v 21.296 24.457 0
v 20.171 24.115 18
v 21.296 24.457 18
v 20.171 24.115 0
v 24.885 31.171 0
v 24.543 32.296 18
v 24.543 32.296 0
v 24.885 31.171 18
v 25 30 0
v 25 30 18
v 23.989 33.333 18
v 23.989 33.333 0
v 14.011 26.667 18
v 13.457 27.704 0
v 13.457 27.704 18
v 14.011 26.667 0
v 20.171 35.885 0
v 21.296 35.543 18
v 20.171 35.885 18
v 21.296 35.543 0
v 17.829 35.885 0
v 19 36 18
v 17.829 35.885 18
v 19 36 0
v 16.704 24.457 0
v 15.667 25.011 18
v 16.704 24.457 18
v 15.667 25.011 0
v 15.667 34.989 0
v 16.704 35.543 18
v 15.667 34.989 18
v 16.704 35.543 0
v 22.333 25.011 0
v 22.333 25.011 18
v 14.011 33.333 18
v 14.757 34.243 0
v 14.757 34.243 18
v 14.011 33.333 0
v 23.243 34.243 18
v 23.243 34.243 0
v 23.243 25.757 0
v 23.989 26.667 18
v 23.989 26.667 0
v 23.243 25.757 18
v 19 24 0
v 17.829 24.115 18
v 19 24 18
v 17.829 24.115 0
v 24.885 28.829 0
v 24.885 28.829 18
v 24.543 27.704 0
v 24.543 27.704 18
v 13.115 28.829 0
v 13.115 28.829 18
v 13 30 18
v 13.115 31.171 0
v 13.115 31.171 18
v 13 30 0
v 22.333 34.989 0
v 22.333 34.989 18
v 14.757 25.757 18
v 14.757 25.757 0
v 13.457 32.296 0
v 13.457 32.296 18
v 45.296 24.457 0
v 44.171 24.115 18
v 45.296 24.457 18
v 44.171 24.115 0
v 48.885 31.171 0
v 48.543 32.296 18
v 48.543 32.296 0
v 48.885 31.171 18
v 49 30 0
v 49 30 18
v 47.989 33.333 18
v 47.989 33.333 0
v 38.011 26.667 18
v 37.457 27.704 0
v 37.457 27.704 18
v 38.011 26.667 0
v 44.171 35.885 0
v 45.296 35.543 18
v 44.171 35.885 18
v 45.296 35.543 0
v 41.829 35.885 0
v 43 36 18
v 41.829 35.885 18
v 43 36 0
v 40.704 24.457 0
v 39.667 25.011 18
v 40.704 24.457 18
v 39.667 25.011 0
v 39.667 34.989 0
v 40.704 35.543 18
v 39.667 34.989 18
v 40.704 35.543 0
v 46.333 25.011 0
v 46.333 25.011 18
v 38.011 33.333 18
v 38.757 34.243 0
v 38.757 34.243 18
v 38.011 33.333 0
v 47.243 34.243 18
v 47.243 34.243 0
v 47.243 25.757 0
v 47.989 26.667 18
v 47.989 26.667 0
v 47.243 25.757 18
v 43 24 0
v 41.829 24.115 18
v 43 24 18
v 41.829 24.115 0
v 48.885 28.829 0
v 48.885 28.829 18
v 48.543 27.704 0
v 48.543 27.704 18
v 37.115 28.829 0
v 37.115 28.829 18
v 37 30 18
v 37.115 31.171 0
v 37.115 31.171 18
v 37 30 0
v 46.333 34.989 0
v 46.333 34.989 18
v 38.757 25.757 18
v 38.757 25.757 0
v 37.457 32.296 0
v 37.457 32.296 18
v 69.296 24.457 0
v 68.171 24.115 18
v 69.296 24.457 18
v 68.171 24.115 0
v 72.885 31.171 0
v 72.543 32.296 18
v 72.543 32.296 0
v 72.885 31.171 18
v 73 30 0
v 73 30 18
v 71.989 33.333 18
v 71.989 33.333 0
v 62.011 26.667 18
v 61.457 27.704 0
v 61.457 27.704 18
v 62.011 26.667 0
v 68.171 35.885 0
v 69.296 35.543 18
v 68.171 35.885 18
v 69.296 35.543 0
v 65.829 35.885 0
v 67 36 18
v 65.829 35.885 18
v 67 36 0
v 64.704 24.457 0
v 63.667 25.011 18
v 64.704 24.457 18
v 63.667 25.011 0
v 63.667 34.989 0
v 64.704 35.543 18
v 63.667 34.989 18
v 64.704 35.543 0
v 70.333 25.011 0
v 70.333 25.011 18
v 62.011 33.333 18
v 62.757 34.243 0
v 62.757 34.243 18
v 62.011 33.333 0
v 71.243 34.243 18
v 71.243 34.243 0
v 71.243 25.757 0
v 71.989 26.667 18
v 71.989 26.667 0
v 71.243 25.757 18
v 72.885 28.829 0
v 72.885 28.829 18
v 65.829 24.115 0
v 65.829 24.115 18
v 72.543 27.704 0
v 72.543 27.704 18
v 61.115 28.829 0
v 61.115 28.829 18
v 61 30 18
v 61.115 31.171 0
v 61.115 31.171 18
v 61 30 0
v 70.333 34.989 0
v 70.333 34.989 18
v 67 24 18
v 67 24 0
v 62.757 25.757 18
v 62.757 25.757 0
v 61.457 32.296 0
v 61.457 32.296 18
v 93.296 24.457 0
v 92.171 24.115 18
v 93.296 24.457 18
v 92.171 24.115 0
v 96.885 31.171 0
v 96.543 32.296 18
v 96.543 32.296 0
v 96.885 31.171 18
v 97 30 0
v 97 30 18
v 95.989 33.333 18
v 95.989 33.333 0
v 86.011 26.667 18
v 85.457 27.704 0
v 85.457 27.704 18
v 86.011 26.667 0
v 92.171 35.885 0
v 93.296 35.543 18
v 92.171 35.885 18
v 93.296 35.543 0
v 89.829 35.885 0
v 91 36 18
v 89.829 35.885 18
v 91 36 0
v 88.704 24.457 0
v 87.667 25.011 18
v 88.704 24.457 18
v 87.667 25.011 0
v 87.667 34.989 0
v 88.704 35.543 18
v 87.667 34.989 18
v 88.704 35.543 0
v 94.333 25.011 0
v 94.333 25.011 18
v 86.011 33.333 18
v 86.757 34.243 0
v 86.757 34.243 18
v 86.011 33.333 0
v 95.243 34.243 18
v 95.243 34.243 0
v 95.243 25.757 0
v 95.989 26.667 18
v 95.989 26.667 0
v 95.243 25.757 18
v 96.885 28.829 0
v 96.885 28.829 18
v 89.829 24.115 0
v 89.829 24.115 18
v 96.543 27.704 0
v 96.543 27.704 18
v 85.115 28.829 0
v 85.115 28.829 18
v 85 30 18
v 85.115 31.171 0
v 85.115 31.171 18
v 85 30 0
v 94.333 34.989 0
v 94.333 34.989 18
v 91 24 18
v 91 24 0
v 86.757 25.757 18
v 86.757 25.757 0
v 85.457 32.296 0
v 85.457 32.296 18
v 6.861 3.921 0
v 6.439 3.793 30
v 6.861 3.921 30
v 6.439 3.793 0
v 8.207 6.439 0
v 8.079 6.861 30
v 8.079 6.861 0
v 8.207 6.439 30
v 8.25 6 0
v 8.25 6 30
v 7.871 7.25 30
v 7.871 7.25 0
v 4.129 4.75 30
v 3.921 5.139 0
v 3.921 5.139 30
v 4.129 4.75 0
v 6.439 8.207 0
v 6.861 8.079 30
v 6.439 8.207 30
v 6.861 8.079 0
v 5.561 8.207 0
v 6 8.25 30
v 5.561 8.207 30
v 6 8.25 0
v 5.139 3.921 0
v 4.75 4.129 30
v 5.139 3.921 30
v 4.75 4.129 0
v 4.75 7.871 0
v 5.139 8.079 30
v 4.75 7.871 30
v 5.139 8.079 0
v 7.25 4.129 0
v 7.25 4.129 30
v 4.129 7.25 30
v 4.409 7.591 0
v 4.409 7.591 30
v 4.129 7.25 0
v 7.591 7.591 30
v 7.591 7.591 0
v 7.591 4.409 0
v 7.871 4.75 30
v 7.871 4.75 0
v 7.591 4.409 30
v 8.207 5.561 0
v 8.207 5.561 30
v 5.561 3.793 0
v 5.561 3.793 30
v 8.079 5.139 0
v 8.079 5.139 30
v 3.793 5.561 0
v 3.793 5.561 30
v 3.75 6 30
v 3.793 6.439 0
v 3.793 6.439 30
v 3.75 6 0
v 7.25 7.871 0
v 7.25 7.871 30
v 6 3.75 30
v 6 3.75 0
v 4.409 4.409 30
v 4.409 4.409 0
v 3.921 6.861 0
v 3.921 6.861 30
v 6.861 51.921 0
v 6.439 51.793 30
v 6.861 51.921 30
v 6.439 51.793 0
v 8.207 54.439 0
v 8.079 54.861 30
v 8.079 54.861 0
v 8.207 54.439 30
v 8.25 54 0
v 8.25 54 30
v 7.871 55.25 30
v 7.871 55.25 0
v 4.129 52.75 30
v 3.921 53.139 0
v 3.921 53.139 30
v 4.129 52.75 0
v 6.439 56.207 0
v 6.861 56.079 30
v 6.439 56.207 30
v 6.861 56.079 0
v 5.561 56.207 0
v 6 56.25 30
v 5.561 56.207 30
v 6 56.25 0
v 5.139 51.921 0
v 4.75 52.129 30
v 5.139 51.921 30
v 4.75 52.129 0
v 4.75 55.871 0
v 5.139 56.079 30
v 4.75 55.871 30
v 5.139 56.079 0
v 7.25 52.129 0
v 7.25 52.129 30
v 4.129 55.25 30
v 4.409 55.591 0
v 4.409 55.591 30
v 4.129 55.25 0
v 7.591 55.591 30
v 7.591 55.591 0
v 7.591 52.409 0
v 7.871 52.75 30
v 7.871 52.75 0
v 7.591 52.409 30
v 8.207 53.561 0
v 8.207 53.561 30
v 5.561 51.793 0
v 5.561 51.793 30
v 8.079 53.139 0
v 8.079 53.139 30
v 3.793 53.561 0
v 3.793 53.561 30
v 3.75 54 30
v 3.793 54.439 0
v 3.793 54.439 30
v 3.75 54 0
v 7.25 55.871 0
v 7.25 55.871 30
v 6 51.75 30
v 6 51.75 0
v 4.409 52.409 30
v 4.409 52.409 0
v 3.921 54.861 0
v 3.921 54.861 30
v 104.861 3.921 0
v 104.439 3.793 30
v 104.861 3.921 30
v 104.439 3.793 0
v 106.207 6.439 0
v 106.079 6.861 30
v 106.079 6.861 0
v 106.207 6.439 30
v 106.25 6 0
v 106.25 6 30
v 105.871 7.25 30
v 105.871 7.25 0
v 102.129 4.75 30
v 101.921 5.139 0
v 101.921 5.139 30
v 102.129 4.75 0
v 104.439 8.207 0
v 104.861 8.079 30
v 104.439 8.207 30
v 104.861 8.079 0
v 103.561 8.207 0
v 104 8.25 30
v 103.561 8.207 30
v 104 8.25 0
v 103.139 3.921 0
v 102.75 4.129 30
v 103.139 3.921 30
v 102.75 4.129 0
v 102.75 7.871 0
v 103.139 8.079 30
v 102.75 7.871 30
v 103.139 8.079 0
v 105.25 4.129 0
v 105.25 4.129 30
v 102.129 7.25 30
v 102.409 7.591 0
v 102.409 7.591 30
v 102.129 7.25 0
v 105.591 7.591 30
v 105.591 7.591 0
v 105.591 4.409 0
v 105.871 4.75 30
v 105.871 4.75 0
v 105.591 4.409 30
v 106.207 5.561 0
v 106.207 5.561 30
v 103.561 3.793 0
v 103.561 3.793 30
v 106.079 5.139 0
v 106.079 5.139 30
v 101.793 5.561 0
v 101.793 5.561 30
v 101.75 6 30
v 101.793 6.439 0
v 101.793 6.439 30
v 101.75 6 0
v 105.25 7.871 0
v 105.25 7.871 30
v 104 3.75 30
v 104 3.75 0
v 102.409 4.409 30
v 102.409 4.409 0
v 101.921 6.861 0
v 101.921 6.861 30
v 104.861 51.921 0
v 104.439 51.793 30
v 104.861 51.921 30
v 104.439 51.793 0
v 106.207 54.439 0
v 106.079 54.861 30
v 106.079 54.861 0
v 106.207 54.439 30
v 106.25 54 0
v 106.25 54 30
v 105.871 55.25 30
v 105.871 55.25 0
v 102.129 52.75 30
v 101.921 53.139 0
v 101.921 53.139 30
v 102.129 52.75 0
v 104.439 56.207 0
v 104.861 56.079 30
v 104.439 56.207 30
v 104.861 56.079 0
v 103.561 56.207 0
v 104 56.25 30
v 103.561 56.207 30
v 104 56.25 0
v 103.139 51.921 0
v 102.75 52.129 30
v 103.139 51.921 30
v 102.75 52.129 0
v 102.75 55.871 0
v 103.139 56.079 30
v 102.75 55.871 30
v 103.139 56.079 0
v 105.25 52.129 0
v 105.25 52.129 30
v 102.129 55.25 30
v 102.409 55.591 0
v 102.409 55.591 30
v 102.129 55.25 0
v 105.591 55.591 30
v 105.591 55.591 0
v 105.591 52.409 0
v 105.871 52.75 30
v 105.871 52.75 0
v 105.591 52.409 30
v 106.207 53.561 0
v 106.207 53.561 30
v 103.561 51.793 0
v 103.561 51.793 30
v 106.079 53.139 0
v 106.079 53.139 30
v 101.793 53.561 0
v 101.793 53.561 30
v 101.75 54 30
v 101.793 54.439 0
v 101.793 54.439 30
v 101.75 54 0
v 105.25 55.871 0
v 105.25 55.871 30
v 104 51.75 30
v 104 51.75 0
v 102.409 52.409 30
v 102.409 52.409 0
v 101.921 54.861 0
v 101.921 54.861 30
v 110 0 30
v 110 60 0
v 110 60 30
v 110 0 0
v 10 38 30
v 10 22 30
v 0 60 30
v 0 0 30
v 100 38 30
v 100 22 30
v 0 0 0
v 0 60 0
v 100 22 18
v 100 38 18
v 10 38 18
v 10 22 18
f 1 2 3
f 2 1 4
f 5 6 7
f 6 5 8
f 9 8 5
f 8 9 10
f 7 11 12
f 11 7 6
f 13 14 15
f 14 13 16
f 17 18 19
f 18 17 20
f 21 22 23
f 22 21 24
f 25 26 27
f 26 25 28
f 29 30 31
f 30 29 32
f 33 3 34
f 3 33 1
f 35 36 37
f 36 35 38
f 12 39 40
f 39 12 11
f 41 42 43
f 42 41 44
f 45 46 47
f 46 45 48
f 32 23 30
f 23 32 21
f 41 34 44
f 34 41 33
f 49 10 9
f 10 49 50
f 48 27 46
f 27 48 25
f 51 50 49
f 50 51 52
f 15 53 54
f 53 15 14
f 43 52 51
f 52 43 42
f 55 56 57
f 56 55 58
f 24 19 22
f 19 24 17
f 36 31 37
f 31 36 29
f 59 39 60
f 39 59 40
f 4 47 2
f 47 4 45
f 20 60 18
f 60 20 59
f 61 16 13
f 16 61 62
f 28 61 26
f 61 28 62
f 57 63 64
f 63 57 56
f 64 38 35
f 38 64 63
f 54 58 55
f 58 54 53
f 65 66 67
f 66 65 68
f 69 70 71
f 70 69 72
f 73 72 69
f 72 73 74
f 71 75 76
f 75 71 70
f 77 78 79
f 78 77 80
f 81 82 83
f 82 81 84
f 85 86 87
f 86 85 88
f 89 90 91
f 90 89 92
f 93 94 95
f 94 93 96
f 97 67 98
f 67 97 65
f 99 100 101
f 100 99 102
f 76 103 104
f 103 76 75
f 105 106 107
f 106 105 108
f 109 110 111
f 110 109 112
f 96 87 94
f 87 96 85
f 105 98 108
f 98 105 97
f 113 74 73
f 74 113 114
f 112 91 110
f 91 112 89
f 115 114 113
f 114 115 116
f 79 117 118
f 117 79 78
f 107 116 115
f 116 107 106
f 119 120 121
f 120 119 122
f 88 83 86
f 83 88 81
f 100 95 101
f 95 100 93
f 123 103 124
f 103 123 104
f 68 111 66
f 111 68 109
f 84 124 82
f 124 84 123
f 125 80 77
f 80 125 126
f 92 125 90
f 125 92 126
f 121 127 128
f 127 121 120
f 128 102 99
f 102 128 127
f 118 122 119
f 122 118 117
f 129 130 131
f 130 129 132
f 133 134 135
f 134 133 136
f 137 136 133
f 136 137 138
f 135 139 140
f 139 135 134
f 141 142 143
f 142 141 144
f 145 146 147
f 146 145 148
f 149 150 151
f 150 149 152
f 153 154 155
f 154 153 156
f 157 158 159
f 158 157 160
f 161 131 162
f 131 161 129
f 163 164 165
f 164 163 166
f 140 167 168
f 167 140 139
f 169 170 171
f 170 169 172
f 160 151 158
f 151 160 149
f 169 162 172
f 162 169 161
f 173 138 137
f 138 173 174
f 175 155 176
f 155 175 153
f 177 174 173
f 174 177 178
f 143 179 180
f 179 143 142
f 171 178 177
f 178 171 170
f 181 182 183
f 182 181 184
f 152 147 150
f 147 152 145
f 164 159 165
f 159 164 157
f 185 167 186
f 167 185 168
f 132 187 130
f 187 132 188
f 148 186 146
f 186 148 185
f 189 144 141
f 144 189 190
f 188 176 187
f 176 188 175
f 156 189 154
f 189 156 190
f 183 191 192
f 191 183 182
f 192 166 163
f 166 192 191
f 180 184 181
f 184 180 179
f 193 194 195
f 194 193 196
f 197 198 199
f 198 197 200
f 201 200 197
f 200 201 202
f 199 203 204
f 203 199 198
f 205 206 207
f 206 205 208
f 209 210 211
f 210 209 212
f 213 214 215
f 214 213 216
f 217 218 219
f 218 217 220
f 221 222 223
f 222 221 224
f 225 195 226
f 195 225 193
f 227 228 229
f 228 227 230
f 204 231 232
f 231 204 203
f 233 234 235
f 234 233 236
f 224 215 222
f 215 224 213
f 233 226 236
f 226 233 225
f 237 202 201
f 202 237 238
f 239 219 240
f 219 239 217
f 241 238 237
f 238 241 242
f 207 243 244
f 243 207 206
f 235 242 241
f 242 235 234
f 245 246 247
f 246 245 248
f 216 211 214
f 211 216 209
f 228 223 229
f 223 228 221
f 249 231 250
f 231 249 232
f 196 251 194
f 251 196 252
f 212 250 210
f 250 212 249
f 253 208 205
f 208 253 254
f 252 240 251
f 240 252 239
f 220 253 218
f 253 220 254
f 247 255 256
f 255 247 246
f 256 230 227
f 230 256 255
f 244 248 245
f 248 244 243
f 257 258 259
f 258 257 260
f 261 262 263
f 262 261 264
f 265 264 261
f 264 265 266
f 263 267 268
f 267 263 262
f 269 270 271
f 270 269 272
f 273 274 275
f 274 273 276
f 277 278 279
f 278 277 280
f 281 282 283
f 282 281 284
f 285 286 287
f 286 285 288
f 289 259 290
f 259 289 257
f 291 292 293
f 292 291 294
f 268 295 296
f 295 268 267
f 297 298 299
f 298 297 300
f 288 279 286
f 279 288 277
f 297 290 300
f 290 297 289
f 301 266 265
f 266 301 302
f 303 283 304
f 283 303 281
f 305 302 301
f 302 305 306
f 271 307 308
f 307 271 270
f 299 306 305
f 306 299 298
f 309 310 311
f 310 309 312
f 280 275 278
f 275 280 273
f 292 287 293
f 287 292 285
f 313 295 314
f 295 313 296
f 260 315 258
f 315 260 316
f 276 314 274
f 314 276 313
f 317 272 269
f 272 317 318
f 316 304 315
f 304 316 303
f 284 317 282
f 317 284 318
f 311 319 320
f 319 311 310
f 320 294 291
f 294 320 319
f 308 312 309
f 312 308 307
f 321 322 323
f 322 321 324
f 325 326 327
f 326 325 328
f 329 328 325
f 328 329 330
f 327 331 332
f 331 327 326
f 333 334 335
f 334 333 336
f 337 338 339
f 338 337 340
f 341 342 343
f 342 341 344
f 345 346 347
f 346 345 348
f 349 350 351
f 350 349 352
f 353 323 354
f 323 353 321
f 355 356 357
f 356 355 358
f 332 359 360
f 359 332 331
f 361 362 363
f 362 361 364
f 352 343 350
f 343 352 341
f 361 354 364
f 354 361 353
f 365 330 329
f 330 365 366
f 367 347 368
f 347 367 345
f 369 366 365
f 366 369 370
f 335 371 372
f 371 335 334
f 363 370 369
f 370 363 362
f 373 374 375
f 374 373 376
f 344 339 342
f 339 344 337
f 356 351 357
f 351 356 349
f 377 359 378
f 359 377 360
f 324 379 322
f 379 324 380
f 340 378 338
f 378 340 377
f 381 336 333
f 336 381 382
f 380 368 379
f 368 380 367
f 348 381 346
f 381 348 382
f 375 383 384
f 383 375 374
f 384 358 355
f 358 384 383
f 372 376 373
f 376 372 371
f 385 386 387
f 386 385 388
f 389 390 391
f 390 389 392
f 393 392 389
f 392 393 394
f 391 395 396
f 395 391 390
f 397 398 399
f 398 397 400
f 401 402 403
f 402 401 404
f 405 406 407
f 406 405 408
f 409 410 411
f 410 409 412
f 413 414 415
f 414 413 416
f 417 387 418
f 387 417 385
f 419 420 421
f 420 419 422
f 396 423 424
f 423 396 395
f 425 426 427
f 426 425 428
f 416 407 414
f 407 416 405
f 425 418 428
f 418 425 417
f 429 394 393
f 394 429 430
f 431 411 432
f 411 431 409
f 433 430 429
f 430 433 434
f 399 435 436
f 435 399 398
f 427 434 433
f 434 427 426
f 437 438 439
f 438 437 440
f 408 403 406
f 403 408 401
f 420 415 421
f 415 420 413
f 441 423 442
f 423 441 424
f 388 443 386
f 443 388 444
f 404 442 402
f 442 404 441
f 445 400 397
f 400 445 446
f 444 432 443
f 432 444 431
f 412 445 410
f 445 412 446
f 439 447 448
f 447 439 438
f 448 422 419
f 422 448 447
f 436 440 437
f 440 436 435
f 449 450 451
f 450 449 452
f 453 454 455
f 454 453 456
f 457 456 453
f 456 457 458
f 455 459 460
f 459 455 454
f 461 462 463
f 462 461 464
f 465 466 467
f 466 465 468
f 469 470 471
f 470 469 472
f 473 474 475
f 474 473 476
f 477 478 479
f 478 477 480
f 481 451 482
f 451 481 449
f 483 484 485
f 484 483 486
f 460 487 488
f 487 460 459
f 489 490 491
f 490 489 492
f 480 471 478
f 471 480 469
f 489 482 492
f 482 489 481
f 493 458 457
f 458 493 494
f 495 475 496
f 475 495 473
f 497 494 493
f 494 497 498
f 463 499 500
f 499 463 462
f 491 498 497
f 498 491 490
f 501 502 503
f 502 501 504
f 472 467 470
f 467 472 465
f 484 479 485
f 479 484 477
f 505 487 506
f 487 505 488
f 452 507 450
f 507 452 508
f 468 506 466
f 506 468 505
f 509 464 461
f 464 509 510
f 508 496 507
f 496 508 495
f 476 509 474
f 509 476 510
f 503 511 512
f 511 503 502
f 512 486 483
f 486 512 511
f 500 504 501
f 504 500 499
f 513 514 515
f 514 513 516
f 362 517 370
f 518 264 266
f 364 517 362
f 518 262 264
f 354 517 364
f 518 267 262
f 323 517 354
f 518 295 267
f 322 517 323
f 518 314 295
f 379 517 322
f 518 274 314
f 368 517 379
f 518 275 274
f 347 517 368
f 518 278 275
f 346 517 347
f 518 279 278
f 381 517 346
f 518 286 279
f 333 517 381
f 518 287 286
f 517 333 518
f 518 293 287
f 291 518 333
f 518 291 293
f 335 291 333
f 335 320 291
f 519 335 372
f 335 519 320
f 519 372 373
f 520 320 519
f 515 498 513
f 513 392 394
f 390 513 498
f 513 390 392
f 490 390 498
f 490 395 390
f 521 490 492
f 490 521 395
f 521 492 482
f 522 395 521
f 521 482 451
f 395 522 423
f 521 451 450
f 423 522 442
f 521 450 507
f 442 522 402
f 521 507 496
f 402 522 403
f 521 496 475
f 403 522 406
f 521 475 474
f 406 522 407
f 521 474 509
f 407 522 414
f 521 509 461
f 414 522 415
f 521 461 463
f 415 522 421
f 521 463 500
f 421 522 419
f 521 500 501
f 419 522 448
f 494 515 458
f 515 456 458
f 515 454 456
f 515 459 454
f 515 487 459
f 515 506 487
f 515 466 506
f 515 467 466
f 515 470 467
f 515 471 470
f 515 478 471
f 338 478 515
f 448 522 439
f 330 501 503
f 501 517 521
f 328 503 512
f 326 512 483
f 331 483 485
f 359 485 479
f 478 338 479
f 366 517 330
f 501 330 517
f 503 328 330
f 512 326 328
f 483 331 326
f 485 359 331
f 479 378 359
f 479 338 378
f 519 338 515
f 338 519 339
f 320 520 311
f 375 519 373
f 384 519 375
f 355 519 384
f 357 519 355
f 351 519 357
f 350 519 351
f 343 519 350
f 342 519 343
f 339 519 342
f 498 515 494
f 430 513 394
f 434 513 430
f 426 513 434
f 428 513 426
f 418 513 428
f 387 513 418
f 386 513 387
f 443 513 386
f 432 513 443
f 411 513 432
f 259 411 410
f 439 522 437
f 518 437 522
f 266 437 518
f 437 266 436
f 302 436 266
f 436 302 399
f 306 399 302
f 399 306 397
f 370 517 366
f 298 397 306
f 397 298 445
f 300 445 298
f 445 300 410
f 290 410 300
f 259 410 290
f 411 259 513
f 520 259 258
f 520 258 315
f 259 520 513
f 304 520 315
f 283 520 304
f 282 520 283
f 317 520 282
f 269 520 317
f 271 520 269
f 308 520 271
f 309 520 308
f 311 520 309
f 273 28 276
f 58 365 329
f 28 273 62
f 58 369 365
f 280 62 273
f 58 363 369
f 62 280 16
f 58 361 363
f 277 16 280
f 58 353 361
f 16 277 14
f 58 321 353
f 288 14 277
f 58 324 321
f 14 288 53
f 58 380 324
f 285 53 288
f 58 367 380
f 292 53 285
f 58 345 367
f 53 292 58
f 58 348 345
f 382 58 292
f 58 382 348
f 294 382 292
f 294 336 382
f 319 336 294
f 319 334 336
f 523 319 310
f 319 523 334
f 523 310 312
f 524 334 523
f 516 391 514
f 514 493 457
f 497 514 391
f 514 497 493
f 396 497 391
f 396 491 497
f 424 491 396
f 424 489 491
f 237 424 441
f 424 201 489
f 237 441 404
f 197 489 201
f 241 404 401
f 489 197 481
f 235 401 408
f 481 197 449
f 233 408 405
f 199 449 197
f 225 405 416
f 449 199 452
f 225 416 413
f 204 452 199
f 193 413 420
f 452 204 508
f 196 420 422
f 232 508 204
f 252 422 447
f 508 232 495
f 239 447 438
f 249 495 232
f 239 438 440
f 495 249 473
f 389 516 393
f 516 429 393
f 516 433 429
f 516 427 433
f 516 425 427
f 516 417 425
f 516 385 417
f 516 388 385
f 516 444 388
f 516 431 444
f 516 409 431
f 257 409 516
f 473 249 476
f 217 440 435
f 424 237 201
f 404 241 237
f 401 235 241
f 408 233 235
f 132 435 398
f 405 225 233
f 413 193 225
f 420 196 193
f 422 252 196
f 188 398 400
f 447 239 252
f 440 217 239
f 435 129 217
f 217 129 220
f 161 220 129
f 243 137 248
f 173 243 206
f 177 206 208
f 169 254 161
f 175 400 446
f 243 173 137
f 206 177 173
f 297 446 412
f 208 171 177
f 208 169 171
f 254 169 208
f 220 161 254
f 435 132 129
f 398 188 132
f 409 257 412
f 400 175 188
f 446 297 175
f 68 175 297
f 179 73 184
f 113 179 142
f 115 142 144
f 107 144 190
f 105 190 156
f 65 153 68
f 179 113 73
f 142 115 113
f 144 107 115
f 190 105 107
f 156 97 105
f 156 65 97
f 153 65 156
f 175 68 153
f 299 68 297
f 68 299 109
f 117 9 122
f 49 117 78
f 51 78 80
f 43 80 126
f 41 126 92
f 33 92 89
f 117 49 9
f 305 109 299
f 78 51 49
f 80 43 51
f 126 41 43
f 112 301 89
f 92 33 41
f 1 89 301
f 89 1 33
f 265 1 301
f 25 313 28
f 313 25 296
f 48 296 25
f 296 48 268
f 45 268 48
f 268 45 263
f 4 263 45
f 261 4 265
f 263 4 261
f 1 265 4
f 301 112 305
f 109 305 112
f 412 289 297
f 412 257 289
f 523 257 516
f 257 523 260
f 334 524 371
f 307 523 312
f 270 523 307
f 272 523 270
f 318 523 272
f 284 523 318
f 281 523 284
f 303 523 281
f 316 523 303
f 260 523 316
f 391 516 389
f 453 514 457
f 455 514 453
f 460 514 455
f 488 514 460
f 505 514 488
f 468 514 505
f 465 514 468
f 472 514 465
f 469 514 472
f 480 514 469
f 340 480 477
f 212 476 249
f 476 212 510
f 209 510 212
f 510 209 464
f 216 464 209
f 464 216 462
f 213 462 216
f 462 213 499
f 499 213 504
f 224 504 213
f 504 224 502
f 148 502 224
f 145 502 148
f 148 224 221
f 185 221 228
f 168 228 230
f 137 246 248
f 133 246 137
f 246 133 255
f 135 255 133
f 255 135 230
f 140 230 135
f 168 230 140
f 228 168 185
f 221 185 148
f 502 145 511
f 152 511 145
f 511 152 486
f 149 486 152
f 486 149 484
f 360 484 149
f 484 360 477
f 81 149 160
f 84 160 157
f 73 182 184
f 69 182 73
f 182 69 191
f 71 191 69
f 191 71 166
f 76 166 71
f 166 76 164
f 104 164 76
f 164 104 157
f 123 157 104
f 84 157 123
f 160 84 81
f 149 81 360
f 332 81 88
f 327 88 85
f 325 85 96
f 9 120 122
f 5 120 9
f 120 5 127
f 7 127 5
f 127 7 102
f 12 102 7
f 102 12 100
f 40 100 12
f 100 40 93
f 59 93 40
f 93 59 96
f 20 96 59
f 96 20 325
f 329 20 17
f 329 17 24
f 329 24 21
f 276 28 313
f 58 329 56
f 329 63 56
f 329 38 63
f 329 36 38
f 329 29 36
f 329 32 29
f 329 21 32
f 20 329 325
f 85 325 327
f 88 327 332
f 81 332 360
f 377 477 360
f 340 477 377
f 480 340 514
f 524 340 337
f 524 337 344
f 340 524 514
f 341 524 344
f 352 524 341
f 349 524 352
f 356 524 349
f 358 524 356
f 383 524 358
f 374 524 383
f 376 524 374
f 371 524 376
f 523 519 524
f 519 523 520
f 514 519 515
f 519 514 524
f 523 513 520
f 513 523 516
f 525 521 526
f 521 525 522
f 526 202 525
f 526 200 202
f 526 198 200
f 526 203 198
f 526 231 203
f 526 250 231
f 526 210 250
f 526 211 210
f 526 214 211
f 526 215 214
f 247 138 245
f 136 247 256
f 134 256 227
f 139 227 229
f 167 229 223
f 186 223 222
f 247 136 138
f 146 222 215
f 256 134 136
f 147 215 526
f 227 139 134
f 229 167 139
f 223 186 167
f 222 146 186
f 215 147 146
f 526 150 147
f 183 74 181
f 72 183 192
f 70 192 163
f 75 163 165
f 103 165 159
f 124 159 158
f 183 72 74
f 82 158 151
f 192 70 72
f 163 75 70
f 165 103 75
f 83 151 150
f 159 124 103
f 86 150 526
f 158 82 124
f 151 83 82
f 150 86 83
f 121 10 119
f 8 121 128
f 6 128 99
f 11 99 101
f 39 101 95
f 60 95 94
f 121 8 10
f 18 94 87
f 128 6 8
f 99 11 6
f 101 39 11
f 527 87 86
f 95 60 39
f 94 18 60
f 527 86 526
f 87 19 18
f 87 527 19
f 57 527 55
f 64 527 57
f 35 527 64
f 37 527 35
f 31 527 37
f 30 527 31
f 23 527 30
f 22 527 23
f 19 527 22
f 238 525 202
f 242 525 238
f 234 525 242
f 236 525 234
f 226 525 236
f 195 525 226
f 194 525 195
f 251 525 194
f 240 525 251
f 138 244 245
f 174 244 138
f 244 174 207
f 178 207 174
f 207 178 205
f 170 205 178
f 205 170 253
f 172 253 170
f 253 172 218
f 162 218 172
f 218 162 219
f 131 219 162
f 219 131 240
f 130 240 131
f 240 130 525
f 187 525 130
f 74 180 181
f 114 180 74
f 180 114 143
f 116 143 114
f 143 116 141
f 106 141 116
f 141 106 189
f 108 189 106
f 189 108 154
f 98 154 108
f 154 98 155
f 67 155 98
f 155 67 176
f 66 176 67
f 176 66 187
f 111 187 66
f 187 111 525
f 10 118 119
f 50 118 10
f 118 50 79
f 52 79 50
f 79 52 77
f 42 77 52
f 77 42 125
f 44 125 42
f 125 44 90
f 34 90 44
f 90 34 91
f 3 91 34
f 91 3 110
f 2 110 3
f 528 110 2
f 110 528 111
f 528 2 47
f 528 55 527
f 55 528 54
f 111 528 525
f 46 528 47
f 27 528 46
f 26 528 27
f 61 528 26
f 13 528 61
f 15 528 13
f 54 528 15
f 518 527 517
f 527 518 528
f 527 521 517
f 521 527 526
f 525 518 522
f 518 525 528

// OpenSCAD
$fn = 32;

// ----------------------------------------------------------------------
// Manifold block: gallery_top manifold
// ----------------------------------------------------------------------

// --- parameters (mm) ---
block_l = 110;            // block length, X
block_w = 60;             // block width, Y
block_h = 30;             // block height, Z
port_d = 12;              // port bore diameter
port_pitch = 24;          // port pitch along X
gallery_d = 16;           // top gallery width, Y
gallery_depth = 12;       // gallery pocket depth
wall_p = 10;              // gallery end wall thickness, X
mnt_d = 4.5;              // mounting hole diameter
mnt_in = 6;               // mounting hole inset from the edges

n_ports = 4;  // ports in the row
port_x0 = (block_l - (n_ports - 1) * port_pitch) / 2;  // first port X

difference() {
  cube([block_l, block_w, block_h]);
  for (i = [0 : n_ports - 1])
    translate([port_x0 + i * port_pitch, block_w / 2, -1])
      cylinder(h = block_h + 2, d = port_d);
  translate([wall_p, block_w / 2 - gallery_d / 2, block_h - gallery_depth])
    cube([block_l - 2 * wall_p, gallery_d, gallery_depth + 1]);
  for (cx = [mnt_in, block_l - mnt_in])
    for (cy = [mnt_in, block_w - mnt_in])
      translate([cx, cy, -1]) cylinder(h = block_h + 2, d = mnt_d);
}
